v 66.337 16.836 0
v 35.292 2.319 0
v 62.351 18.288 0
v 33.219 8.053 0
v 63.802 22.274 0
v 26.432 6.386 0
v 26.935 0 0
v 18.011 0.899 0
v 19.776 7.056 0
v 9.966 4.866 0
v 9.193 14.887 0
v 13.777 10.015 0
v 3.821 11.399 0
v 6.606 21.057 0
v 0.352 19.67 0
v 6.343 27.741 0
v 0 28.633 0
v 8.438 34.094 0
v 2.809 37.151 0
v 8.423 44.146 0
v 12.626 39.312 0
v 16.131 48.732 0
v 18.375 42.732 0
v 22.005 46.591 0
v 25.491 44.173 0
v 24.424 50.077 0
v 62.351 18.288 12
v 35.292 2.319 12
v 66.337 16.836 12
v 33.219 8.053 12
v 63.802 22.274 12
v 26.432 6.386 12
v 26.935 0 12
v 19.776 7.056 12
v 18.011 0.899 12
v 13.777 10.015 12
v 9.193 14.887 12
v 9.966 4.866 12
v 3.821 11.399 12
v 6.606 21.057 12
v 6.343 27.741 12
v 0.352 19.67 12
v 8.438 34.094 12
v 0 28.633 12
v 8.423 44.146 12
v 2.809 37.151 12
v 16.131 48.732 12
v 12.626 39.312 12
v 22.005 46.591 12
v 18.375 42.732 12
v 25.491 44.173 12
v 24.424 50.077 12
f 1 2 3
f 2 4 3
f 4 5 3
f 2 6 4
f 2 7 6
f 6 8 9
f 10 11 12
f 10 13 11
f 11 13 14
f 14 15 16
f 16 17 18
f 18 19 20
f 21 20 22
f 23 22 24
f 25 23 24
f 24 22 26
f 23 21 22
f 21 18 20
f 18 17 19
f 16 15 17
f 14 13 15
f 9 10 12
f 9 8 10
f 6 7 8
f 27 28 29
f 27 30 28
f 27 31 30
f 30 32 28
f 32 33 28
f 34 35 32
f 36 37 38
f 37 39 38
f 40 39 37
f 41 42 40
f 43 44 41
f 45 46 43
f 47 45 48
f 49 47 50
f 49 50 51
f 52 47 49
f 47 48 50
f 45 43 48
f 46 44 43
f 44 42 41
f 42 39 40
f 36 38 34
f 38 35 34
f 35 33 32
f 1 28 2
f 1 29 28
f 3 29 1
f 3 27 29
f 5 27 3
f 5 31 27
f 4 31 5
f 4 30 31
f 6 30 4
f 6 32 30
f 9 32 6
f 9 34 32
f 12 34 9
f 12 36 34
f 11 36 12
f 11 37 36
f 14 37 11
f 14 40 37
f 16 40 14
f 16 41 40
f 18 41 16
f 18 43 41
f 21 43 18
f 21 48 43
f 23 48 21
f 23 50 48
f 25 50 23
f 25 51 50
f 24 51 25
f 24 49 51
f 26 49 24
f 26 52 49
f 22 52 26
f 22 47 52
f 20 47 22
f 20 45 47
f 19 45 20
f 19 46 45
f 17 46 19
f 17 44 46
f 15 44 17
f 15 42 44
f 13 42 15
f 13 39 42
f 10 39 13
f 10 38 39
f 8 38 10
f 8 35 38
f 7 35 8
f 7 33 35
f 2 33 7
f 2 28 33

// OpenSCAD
$fn = 32;

// ----------------------------------------------------------------------
// Hook plate: curl radius 22 mm over 205 degrees, 6 mm thick band
// ----------------------------------------------------------------------

// --- parameters (mm) ---
profile_height = 12;      // extrusion height
profile_points = 26;      // points of the closed outline

profile = [[22.005, 46.591], [24.424, 50.077], [16.131, 48.732], [8.423, 44.146], [2.809, 37.151], [0, 28.633], [0.352, 19.67], [3.821, 11.399], [9.966, 4.866], [18.011, 0.899], [26.935, 0], [35.292, 2.319], [66.337, 16.836], [62.351, 18.288], [63.802, 22.274], [33.219, 8.053], [26.432, 6.386], [19.776, 7.056], [13.777, 10.015], [9.193, 14.887], [6.606, 21.057], [6.343, 27.741], [8.438, 34.094], [12.626, 39.312], [18.375, 42.732], [25.491, 44.173]];  // single closed polygon, 26 points, counter clockwise

// --- the one profile operation ---
linear_extrude(height = profile_height) polygon(points = profile);
